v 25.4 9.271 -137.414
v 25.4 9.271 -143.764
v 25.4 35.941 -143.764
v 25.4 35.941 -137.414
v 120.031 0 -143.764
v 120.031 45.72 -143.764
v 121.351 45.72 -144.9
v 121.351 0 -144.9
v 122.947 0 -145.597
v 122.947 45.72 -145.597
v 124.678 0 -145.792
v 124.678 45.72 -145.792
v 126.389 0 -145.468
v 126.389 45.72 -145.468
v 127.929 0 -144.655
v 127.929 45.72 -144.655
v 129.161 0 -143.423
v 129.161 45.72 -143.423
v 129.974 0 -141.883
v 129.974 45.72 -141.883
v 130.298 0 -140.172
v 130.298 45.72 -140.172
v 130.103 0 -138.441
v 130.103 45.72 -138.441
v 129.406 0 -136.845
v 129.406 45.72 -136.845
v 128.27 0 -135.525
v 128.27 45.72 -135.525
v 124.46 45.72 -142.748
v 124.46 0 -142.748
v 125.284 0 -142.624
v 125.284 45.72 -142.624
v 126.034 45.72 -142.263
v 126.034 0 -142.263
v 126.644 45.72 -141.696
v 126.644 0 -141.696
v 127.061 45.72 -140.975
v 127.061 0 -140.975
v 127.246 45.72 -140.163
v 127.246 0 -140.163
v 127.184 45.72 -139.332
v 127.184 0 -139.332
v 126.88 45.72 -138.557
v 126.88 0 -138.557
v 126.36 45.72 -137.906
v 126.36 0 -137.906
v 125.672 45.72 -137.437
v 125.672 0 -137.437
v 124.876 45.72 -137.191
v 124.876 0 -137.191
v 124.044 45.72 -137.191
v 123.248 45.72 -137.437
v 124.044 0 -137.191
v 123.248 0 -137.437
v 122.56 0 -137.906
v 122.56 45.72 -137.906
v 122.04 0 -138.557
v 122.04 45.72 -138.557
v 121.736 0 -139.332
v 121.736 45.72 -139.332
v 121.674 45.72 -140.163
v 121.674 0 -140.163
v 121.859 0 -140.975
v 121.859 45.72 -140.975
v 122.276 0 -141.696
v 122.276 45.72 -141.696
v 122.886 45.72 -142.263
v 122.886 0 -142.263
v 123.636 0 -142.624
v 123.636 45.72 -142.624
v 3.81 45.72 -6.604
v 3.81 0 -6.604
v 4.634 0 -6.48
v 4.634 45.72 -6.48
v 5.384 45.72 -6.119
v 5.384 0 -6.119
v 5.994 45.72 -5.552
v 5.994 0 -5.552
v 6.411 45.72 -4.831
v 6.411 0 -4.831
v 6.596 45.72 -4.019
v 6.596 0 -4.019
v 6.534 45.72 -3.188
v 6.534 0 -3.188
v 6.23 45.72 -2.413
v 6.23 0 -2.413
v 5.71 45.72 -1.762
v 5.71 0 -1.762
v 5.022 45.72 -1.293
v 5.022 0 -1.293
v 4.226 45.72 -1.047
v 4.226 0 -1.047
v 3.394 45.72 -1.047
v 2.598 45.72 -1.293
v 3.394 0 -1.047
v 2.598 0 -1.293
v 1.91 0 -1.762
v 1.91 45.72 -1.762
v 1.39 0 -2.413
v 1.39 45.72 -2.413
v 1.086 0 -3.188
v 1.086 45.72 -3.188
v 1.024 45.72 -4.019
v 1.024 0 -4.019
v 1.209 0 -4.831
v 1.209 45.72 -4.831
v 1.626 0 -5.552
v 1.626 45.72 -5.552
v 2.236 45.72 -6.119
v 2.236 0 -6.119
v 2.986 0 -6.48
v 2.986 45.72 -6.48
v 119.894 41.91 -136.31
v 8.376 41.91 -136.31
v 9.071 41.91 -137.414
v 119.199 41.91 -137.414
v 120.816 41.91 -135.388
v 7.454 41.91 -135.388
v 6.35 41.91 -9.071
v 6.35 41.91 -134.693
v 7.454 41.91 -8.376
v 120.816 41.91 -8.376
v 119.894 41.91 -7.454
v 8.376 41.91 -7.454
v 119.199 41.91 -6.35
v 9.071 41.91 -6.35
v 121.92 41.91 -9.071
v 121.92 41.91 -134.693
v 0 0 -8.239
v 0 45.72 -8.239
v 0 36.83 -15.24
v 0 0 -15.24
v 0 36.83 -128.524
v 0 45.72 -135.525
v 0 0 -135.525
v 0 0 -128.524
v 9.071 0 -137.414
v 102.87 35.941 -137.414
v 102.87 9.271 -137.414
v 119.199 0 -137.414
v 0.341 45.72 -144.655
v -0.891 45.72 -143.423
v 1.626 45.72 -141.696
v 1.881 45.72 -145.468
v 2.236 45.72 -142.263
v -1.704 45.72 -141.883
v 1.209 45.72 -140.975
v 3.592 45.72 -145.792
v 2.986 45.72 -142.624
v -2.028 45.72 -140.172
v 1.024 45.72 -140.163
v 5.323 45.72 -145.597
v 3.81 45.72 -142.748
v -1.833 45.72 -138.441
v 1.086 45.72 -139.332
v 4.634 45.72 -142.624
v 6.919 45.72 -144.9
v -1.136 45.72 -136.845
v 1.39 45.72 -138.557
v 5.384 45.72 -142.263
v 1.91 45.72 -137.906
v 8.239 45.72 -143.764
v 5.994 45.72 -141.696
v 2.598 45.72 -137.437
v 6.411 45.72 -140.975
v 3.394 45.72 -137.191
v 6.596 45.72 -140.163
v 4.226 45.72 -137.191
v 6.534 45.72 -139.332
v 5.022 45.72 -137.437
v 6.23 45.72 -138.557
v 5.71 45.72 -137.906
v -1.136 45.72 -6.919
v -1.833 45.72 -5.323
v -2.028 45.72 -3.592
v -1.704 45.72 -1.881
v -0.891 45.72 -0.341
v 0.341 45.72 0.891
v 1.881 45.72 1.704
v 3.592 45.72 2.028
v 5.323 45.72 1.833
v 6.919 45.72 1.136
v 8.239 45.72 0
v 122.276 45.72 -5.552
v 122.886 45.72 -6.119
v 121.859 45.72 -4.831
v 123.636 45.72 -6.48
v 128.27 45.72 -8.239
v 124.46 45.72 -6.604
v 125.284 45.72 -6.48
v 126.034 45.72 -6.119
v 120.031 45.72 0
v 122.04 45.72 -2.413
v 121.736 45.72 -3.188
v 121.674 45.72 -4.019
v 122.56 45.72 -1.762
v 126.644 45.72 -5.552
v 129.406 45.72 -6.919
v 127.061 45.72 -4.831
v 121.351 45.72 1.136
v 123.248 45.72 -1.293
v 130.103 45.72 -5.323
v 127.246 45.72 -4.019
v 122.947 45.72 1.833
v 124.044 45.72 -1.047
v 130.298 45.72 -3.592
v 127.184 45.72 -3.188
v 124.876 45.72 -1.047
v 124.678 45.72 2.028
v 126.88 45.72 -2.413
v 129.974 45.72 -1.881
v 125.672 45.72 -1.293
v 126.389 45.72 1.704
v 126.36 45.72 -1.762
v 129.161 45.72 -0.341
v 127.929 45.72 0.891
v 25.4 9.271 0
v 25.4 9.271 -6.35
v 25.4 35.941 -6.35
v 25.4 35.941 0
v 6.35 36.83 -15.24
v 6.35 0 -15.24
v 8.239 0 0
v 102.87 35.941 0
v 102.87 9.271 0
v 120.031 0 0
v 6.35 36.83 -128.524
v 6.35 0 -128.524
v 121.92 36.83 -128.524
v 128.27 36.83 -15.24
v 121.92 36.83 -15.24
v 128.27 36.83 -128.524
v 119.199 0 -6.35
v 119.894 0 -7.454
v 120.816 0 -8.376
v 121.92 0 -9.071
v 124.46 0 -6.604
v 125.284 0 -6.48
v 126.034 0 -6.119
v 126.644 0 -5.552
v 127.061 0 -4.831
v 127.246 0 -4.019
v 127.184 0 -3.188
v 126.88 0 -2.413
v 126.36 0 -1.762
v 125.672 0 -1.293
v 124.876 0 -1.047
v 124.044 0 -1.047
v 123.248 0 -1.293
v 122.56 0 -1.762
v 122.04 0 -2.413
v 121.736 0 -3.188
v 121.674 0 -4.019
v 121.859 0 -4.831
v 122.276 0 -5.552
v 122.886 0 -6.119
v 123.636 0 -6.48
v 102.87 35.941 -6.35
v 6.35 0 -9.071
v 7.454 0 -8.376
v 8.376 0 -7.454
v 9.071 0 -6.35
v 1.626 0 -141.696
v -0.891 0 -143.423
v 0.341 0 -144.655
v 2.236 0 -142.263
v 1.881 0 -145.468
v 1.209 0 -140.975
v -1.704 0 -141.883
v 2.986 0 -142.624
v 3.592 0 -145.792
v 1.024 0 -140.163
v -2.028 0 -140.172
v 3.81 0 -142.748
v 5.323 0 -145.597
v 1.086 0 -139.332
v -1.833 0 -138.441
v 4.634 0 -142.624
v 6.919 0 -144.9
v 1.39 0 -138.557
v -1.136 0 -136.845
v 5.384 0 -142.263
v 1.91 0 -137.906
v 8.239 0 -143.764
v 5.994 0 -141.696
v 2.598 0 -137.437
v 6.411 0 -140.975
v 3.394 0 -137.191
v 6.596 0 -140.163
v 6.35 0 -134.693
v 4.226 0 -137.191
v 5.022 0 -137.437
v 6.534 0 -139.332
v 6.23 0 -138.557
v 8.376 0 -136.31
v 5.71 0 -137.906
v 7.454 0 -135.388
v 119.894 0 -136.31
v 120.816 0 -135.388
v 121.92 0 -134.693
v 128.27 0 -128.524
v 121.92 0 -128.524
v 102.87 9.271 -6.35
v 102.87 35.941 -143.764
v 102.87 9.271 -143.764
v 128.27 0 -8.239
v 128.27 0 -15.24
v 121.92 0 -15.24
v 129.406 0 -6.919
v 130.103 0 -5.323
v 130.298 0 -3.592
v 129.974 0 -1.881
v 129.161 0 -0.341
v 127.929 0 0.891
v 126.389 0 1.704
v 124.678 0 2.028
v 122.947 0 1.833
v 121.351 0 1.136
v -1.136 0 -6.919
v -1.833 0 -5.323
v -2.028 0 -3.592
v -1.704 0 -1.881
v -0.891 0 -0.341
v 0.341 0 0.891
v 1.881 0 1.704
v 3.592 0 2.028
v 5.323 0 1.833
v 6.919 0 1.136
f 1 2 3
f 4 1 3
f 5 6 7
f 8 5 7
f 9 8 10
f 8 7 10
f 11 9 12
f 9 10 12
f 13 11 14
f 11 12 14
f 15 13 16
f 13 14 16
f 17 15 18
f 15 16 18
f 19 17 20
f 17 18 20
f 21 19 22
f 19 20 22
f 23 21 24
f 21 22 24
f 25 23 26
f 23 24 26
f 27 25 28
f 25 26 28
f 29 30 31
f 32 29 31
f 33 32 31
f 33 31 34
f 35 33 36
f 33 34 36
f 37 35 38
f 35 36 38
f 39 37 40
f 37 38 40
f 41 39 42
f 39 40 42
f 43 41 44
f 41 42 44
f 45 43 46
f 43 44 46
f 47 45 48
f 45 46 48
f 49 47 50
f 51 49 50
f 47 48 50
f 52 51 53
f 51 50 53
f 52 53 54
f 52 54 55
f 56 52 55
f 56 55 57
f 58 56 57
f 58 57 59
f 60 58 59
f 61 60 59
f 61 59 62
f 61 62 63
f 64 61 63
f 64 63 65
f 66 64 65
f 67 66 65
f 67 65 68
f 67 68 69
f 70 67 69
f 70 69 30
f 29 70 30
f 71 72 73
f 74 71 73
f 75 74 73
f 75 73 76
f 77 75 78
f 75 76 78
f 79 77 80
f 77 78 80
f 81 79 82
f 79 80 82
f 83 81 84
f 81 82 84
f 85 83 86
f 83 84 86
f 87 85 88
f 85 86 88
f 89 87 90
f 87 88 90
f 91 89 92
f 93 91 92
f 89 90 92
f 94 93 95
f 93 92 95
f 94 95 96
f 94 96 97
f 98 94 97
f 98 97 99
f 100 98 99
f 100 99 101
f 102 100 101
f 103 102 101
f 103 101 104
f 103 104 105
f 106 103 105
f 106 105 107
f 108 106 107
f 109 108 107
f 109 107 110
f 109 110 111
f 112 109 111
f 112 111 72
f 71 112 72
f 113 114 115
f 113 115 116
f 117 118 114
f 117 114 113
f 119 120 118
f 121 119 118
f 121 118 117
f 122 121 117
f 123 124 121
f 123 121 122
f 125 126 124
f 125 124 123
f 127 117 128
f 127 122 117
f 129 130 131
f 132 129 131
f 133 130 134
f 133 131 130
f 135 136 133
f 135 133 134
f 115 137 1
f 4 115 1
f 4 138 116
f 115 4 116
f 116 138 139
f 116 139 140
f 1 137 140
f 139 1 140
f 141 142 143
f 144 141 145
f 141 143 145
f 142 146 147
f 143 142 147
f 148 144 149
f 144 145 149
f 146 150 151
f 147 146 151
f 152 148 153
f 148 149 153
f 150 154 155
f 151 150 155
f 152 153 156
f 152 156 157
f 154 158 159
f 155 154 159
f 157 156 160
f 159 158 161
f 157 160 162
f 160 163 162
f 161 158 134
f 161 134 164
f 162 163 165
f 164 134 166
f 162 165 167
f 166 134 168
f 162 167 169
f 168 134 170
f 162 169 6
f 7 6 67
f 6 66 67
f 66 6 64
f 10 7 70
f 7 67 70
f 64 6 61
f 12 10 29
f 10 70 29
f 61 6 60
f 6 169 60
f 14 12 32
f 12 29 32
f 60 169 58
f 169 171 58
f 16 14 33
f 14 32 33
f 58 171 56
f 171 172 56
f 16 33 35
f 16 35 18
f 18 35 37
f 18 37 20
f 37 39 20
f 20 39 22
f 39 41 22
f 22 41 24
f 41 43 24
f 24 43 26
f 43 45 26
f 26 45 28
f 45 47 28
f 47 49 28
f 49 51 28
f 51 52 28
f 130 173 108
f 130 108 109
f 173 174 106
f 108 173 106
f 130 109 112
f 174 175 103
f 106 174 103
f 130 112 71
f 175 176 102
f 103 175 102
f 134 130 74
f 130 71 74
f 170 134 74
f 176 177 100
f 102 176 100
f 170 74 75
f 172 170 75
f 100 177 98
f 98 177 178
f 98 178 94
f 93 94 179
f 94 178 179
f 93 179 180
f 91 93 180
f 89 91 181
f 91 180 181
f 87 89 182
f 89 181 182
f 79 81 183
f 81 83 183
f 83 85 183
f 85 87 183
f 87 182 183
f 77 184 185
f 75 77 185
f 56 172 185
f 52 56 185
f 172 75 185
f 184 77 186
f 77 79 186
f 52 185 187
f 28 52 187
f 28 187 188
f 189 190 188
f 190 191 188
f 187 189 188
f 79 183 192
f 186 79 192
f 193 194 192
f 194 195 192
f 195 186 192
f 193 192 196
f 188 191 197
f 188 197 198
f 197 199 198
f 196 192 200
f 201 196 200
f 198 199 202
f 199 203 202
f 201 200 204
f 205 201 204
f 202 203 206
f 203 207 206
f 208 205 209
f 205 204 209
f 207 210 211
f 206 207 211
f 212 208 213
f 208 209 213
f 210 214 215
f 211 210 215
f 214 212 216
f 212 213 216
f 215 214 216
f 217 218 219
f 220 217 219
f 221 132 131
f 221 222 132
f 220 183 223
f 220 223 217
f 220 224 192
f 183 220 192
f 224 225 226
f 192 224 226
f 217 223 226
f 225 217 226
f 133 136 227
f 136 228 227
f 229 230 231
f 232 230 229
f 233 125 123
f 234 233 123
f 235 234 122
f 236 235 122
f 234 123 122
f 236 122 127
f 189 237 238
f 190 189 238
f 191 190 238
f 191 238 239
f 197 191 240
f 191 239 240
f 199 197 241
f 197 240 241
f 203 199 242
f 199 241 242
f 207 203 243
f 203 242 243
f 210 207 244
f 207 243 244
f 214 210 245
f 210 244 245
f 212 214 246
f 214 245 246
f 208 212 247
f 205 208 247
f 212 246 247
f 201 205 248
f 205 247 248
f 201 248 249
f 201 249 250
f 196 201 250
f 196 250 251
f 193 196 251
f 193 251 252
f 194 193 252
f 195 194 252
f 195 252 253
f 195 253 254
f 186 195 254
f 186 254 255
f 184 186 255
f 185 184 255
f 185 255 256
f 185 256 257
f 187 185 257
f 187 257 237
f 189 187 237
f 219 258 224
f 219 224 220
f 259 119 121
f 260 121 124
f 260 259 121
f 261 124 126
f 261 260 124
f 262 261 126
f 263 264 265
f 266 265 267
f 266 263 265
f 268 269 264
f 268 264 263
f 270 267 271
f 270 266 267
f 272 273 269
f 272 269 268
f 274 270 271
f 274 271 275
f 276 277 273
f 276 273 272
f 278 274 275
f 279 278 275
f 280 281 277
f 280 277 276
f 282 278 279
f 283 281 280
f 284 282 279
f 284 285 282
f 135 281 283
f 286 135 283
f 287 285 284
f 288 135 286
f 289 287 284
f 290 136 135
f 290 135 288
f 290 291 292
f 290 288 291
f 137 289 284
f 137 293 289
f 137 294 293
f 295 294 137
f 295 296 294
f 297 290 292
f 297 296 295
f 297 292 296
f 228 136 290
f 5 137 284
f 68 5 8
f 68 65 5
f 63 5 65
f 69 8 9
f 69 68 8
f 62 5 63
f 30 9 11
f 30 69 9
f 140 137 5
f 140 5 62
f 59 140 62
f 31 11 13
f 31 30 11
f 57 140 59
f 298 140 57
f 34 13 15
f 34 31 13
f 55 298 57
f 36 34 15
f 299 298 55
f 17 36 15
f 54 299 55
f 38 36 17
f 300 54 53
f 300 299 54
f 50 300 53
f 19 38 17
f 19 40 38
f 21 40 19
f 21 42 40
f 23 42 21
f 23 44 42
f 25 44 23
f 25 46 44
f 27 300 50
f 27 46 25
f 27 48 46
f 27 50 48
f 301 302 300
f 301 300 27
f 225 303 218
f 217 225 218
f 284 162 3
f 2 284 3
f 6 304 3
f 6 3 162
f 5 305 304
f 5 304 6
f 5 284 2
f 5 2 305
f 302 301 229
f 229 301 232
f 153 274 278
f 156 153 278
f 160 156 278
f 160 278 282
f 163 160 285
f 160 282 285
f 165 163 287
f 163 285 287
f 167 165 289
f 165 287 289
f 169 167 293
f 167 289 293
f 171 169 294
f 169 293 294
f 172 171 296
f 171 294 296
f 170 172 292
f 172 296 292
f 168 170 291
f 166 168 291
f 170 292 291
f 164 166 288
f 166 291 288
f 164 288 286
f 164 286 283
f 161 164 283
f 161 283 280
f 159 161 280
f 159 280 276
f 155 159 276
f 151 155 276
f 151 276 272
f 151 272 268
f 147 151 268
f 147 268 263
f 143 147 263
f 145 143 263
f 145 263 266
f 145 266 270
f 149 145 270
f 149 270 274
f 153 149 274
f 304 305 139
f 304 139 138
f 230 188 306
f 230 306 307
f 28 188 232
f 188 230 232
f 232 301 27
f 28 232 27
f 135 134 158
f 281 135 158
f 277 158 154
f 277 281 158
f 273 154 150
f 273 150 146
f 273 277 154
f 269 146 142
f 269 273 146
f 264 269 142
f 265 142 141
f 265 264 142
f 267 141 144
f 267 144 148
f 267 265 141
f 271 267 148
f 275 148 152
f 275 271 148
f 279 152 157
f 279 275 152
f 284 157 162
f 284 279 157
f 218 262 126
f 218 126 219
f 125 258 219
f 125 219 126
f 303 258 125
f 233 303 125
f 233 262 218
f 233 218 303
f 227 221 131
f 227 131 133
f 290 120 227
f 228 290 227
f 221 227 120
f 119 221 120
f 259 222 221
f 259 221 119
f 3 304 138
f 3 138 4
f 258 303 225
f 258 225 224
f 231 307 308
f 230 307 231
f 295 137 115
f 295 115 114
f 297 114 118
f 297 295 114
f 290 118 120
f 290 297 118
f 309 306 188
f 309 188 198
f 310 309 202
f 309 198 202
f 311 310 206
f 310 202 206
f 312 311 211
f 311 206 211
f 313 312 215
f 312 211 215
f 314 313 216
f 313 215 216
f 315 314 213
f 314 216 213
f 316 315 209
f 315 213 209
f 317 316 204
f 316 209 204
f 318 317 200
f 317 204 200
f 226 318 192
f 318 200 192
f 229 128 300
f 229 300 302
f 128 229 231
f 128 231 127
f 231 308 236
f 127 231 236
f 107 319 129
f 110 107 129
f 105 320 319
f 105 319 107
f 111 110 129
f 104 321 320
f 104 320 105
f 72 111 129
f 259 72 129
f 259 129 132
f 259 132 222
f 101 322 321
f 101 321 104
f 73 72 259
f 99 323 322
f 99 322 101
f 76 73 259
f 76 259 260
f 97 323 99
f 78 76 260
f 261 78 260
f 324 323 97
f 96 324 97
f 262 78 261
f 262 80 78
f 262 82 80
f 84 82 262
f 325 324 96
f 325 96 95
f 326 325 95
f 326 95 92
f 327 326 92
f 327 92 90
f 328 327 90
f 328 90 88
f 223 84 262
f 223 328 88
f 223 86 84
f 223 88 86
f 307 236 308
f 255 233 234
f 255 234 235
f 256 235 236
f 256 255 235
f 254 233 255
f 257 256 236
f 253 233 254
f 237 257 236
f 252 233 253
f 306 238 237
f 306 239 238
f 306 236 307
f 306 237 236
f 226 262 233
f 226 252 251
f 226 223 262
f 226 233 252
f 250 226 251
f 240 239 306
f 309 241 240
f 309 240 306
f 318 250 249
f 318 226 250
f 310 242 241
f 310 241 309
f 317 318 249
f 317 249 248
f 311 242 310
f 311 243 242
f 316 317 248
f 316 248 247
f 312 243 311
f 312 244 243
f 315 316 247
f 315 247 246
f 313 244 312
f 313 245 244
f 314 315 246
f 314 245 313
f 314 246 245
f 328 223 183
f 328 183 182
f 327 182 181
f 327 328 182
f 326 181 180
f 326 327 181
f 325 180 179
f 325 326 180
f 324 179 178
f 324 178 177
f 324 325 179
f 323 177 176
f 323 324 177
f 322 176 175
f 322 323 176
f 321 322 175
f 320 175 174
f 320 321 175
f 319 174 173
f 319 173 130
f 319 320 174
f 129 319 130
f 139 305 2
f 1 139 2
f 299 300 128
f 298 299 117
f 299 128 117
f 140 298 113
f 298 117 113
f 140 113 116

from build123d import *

# Parameters (mm, degrees)
SKETCH1_W           = 128.27
SKETCH1_H           = 143.764
BOSS_EXTRUDE1_DEPTH = 45.72
SKETCH3_W           = 115.57
SKETCH3_H           = 131.064
CUT_EXTRUDE1_DEPTH  = 41.91
SKETCH4_W           = 77.47
SKETCH4_H           = 26.67
CUT_EXTRUDE2_DEPTH  = 190.754
SKETCH5_W           = 113.284
SKETCH5_H           = 46.99
CUT_EXTRUDE3_DEPTH  = 190.754
SKETCH6_R           = 2.794
CUT_EXTRUDE4_DEPTH  = 199.019188454
SKETCH7_R           = 5.842
SKETCH7_R_2         = 2.794
BOSS_EXTRUDE2_DEPTH = 45.72
BOSS_EXTRUDE3_START = -45.72
SKETCH8_R           = 5.842
SKETCH8_R_2         = 2.794
BOSS_EXTRUDE3_DEPTH = 45.72
SKETCH9_R           = 5.842
SKETCH9_R_2         = 2.794
BOSS_EXTRUDE4_DEPTH = 45.72
BOSS_EXTRUDE5_START = -45.72
SKETCH10_R          = 5.842
SKETCH10_R_2        = 2.794
BOSS_EXTRUDE5_DEPTH = 45.72


with BuildPart() as part:
    # Sketch1 → Boss-Extrude1 (new body)
    with BuildSketch(Plane(origin=(0, 0, 0), x_dir=(1, 0, 0), z_dir=(0, 1, 0))):
        with Locations((64.135, 71.882)):
            Rectangle(SKETCH1_W, SKETCH1_H)
    extrude(amount=BOSS_EXTRUDE1_DEPTH)

    # Sketch3 → Cut-Extrude1 (cut)
    with BuildSketch(Plane.XZ):
        with Locations((64.135, -71.882)):
            Rectangle(SKETCH3_W, SKETCH3_H)
    extrude(amount=-CUT_EXTRUDE1_DEPTH, mode=Mode.SUBTRACT)

    # Sketch4 → Cut-Extrude2 (cut)
    with BuildSketch(Plane(origin=(0, 0, -143.764), x_dir=(-1, 0, 0), z_dir=(0, 0, -1))):
        with Locations((-64.135, 22.606)):
            Rectangle(SKETCH4_W, SKETCH4_H)
    extrude(amount=-CUT_EXTRUDE2_DEPTH, mode=Mode.SUBTRACT)

    # Sketch5 → Cut-Extrude3 (cut)
    with BuildSketch(Plane(origin=(128.27, 0, 0), x_dir=(0, 0, -1), z_dir=(1, 0, 0))):
        with Locations((71.882, 13.335)):
            Rectangle(SKETCH5_W, SKETCH5_H)
    extrude(amount=-CUT_EXTRUDE3_DEPTH, mode=Mode.SUBTRACT)

    # Sketch6 → Cut-Extrude4 (cut, through all)
    with BuildSketch(Plane(origin=(0, 0, 0), x_dir=(-1, 0, 0), z_dir=(0, -1, 0))):
        with Locations(Location((-3.81, 3.81, 0), (0, 0, 90))):
            Circle(SKETCH6_R)
        with Locations(Location((-124.46, 3.81, 0), (0, 0, 90))):
            Circle(SKETCH6_R)
        with Locations(Location((-3.81, 139.954, 0), (0, 0, 90))):
            Circle(SKETCH6_R)
        with Locations(Location((-124.46, 139.954, 0), (0, 0, 90))):
            Circle(SKETCH6_R)
    extrude(amount=-CUT_EXTRUDE4_DEPTH, mode=Mode.SUBTRACT)

    # Sketch7 → Boss-Extrude2 (add, through all)
    with BuildSketch(Plane.XZ):
        with Locations((3.81, -3.81)):
            Circle(SKETCH7_R)
        with Locations(Location((3.81, -3.81, 0), (0, 0, 270))):
            Circle(SKETCH7_R_2, mode=Mode.SUBTRACT)
    extrude(amount=-BOSS_EXTRUDE2_DEPTH)

    # Sketch8 → Boss-Extrude3 (add)
    with BuildSketch(Plane.XZ.offset(BOSS_EXTRUDE3_START)):
        with Locations((124.46, -3.81)):
            Circle(SKETCH8_R)
        with Locations(Location((124.46, -3.81, 0), (0, 0, 270))):
            Circle(SKETCH8_R_2, mode=Mode.SUBTRACT)
    extrude(amount=BOSS_EXTRUDE3_DEPTH)

    # Sketch9 → Boss-Extrude4 (add, through all)
    with BuildSketch(Plane.XZ):
        with Locations((3.81, -139.954)):
            Circle(SKETCH9_R)
        with Locations(Location((3.81, -139.954, 0), (0, 0, 270))):
            Circle(SKETCH9_R_2, mode=Mode.SUBTRACT)
    extrude(amount=-BOSS_EXTRUDE4_DEPTH)

    # Sketch10 → Boss-Extrude5 (add)
    with BuildSketch(Plane.XZ.offset(BOSS_EXTRUDE5_START)):
        with Locations((124.46, -139.954)):
            Circle(SKETCH10_R)
        with Locations(Location((124.46, -139.954, 0), (0, 0, 270))):
            Circle(SKETCH10_R_2, mode=Mode.SUBTRACT)
    extrude(amount=BOSS_EXTRUDE5_DEPTH)


solid = part.part
